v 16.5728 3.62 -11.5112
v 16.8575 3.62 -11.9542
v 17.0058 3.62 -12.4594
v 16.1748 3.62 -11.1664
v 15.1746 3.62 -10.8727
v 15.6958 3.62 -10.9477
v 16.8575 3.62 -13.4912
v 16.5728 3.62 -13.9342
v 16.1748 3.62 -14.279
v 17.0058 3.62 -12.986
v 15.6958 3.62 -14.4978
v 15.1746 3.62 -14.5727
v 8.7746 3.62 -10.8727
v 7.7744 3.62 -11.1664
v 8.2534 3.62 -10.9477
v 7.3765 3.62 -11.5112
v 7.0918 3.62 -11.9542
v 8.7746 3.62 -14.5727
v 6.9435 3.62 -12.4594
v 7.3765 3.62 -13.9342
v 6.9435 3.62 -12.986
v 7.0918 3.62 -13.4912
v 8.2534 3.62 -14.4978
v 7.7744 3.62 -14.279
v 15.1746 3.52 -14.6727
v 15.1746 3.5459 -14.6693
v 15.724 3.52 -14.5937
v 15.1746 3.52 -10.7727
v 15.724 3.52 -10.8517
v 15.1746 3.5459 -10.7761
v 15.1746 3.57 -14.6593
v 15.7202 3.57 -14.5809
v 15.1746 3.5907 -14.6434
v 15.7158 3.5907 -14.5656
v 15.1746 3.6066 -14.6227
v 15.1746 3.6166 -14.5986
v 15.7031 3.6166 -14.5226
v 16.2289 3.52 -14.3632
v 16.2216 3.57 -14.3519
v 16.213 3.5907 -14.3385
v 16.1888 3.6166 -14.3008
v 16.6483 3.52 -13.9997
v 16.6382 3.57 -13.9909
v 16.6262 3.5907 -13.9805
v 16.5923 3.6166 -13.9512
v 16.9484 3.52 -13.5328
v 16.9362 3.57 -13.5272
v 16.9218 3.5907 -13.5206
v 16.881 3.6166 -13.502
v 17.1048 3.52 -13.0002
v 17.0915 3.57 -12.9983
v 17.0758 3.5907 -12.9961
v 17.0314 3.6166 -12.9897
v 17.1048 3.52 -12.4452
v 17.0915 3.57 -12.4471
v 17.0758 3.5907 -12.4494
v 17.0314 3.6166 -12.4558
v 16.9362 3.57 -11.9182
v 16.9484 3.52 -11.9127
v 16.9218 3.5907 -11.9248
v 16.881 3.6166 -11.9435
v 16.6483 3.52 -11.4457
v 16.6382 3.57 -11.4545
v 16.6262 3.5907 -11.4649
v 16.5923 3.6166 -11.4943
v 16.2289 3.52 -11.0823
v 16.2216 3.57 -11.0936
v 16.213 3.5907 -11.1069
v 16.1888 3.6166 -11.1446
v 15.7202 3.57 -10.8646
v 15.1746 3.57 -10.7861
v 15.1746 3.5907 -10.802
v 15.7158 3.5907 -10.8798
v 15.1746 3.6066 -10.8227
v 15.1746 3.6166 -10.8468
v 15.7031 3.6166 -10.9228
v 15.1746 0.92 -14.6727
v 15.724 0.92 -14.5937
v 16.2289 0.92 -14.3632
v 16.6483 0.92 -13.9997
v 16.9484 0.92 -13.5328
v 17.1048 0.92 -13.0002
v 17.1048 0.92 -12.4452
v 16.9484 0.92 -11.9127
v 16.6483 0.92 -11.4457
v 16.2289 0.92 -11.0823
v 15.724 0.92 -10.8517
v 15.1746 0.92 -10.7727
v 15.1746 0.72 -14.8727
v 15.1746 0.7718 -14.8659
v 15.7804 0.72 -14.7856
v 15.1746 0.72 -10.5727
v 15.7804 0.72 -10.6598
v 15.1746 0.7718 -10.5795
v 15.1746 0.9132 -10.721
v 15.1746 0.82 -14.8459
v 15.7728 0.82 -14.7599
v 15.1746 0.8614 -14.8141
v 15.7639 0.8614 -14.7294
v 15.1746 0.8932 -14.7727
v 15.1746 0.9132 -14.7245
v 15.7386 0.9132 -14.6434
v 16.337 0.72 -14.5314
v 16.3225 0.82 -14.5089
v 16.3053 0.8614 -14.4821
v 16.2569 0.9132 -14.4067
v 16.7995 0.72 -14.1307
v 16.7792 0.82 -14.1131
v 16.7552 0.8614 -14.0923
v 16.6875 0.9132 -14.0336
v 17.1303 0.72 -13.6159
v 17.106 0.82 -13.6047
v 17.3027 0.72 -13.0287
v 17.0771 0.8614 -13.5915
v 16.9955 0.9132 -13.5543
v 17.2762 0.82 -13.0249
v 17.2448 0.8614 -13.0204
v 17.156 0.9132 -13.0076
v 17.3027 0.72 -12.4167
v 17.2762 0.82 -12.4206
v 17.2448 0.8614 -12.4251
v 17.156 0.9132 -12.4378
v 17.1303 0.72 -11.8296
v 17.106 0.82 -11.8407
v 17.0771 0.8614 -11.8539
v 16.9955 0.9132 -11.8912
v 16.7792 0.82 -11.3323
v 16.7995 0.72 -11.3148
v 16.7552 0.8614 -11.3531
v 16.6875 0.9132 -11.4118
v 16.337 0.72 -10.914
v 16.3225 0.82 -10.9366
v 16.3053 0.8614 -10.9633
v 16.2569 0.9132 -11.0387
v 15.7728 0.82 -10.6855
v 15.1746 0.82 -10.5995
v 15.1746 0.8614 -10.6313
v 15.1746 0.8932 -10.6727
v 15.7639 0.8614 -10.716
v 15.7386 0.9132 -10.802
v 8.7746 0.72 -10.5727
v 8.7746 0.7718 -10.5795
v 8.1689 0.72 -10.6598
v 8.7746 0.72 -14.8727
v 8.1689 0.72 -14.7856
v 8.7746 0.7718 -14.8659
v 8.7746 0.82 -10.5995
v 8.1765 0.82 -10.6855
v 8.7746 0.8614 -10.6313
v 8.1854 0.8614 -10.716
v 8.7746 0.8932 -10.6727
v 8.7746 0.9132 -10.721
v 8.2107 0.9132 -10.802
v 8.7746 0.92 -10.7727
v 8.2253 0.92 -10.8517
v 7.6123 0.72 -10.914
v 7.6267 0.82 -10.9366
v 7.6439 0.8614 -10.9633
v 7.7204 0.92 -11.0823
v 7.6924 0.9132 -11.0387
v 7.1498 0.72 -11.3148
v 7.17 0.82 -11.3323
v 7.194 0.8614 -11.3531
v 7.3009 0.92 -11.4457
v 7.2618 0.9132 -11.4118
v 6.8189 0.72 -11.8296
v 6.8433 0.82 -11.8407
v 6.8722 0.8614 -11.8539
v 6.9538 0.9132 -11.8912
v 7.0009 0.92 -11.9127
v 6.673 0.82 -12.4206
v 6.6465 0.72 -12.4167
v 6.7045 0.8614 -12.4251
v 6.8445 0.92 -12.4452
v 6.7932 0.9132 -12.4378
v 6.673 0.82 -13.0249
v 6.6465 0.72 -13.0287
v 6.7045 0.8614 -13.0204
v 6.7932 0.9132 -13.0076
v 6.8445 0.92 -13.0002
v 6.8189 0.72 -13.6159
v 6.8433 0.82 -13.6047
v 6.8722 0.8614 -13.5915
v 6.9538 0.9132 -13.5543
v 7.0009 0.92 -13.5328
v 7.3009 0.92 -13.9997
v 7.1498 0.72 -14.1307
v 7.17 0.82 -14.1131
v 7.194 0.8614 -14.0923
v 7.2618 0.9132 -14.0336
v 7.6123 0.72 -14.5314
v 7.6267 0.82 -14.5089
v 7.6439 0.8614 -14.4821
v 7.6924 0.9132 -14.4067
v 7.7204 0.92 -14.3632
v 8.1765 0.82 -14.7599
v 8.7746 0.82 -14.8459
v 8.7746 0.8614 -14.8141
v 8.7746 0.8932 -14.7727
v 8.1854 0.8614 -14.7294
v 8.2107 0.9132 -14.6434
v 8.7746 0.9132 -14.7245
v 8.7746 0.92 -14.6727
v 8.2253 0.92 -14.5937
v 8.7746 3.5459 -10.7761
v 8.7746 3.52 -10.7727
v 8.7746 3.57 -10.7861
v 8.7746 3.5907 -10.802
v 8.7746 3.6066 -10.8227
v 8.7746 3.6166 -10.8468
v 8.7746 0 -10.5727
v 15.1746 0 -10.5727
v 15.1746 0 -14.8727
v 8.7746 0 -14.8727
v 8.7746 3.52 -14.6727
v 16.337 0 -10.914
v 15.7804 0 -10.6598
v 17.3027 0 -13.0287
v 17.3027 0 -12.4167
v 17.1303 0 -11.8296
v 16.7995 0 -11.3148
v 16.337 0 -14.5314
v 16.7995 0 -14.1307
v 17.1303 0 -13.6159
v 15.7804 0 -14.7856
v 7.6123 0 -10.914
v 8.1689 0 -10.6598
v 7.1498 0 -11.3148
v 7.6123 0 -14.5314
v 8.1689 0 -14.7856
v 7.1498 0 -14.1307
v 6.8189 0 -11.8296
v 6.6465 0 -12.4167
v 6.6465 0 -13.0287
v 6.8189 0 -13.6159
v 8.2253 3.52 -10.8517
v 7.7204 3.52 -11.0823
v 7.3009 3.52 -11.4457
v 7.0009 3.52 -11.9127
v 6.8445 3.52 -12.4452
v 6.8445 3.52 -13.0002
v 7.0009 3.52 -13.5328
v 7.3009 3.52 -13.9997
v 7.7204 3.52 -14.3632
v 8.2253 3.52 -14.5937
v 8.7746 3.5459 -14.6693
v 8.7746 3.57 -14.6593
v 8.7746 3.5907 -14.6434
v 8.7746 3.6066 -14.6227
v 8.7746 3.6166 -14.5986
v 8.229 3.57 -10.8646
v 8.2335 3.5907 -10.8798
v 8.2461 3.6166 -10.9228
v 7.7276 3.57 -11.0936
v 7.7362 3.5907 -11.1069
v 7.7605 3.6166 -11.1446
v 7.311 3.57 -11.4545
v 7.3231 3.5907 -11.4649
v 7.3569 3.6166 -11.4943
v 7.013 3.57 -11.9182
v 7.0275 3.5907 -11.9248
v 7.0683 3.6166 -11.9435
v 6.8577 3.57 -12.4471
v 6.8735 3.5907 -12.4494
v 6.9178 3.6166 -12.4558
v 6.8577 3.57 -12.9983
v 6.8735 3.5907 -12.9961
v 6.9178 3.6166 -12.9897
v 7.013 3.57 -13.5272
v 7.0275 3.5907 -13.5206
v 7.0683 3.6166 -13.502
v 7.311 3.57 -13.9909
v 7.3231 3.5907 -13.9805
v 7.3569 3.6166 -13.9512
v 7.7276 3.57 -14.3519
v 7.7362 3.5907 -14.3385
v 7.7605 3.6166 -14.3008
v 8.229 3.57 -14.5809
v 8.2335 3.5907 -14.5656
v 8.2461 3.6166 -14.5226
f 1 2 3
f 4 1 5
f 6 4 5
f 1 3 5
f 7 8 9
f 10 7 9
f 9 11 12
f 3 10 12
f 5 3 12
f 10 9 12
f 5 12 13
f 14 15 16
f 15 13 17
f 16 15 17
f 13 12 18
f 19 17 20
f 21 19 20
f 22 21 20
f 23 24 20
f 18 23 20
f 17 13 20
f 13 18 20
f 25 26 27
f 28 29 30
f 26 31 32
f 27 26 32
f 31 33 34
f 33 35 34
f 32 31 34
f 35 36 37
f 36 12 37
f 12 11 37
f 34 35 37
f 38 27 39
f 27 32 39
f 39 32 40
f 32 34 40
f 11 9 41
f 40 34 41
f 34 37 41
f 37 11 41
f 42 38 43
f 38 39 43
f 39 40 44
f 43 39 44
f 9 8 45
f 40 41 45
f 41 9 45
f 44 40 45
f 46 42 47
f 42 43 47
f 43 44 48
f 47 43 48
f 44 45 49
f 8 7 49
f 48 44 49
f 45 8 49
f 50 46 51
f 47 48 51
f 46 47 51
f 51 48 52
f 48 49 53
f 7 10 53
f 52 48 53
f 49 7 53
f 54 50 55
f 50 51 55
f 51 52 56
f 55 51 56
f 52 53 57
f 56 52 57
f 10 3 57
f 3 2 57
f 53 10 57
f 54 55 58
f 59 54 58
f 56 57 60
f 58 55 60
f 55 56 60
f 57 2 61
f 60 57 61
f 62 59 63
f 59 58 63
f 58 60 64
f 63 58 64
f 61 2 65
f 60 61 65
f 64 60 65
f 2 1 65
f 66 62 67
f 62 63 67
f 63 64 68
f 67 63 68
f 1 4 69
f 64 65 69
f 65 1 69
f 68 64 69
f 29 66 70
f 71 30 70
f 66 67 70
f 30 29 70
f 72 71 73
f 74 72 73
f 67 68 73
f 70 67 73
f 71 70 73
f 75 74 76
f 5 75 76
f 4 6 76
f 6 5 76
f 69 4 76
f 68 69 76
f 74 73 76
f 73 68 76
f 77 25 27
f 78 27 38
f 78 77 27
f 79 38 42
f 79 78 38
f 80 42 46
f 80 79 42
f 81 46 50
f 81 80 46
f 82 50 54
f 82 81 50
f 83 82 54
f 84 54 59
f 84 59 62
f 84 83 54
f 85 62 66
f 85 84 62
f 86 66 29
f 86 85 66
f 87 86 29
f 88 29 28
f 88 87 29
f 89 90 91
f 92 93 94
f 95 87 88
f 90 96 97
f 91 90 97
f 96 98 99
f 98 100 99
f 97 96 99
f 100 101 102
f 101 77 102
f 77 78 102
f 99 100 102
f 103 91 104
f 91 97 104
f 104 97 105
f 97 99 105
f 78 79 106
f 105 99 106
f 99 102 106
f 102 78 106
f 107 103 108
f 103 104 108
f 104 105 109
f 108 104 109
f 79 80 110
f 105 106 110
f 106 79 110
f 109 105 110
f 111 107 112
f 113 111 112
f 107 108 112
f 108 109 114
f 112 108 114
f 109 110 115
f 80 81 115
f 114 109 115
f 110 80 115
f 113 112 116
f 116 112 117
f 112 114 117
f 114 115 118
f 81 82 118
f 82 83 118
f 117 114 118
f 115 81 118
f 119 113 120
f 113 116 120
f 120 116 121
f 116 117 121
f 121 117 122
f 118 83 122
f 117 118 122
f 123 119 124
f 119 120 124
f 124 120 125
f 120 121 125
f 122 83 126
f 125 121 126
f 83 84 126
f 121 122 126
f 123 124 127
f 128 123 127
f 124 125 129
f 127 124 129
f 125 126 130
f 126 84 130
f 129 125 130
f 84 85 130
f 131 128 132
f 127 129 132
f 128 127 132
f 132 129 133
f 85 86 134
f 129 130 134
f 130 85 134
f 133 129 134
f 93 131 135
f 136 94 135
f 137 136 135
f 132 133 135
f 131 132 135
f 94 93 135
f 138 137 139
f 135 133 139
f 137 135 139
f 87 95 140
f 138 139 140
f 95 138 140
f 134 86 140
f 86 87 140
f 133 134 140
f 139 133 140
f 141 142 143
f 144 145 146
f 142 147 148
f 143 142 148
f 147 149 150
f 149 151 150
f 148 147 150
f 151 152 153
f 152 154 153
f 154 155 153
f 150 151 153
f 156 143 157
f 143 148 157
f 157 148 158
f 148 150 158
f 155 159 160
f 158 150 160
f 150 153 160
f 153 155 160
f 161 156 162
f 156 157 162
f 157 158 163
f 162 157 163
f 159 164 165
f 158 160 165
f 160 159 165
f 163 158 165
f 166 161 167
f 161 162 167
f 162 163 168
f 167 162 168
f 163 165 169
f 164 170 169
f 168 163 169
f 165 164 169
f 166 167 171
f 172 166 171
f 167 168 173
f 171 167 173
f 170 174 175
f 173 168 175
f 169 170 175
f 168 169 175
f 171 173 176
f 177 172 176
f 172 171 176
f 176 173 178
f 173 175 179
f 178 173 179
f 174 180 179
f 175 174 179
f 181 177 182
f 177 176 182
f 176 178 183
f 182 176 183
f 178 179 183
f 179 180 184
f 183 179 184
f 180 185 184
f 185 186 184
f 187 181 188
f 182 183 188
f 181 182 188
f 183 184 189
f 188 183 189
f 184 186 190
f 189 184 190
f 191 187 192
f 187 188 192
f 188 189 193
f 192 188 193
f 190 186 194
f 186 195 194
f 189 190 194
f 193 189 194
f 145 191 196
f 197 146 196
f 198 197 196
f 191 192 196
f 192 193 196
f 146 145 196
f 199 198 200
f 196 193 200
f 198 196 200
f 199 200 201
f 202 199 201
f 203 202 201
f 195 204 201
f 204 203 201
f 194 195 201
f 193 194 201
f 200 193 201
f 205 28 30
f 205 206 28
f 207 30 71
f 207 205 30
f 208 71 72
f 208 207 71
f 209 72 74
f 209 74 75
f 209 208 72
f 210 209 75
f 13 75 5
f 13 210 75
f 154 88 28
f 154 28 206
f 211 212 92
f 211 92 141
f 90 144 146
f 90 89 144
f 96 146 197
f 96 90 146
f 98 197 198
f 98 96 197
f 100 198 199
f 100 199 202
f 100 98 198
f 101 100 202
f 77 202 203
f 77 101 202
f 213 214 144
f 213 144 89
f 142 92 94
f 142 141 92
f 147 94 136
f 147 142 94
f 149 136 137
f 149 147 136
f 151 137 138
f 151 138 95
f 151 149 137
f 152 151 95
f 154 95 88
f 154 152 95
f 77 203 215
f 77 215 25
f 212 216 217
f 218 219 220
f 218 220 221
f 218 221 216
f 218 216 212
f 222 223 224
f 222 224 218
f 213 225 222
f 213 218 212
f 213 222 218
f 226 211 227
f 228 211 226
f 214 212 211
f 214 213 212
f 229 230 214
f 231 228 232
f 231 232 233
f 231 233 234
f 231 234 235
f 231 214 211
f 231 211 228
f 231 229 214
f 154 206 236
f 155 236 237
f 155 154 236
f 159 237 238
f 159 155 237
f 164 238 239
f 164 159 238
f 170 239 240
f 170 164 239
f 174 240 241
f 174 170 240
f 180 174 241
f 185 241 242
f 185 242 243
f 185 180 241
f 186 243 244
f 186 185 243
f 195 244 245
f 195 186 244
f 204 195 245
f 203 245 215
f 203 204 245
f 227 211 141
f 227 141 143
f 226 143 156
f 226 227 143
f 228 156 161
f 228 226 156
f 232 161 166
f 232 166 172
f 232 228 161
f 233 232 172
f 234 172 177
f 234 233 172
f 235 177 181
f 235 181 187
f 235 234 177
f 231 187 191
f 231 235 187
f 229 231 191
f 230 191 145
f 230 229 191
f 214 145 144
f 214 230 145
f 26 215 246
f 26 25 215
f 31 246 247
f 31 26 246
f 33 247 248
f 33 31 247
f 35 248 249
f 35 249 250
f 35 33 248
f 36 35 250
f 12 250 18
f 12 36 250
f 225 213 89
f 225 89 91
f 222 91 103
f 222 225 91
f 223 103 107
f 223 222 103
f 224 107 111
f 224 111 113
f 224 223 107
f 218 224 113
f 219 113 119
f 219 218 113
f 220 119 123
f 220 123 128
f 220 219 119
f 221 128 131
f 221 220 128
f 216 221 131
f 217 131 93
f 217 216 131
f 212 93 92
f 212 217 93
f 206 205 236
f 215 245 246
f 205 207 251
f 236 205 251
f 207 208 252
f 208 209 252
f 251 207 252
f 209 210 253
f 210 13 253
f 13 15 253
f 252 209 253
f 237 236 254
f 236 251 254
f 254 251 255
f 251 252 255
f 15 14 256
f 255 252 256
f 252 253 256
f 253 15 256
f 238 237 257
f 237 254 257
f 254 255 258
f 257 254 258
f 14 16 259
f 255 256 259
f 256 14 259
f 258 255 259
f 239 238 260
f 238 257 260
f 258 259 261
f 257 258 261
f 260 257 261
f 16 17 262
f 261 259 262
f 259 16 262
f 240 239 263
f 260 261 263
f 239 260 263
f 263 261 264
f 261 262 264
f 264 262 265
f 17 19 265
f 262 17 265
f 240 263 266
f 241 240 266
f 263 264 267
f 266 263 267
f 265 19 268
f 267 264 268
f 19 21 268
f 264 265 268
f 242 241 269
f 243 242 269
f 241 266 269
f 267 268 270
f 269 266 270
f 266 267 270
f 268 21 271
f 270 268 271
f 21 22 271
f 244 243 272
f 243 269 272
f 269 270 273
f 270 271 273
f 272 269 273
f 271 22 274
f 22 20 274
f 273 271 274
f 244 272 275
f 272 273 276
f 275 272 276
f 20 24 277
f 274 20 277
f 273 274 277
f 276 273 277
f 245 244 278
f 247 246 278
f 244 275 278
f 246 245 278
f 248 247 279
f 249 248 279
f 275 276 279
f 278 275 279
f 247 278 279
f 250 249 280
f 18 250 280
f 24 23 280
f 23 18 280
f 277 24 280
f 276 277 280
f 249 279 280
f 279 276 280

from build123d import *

# Parameters (mm, degrees)
BOSS_EXTRUDE1_DEPTH = 0.92
FILLET3_R           = 0.2
BOSS_EXTRUDE2_DEPTH = 2.7
FILLET4_R           = 0.1


with BuildPart() as part:
    # Sketch2 → Boss-Extrude1 (new body)
    with BuildSketch(Plane(origin=(0, 0, 0), x_dir=(1, 0, 0), z_dir=(0, 1, 0))):
        with BuildLine():
            Line((8.774632583, 14.872725815), (15.174632583, 14.872725815))
            ThreePointArc((15.174632583, 14.872725815), (17.324632583, 12.722725815), (15.174632583, 10.572725815))
            Line((15.174632583, 10.572725815), (8.774632583, 10.572725815))
            ThreePointArc((8.774632583, 10.572725815), (6.624632583, 12.722725815), (8.774632583, 14.872725815))
        make_face()
    extrude(amount=BOSS_EXTRUDE1_DEPTH)

    # Fillet3
    fillet3_edges = [part.edges().sort_by_distance(p)[0] for p in [
        (17.324632583, 0.92, -12.722725815),
        (11.974632583, 0.92, -14.872725815),
        (6.624632583, 0.92, -12.722725815),
        (11.974632583, 0.92, -10.572725815),
    ]]
    fillet(fillet3_edges, radius=FILLET3_R)

    # Sketch5 → Boss-Extrude2 (add)
    with BuildSketch(Plane(origin=(0, 0.92, 0), x_dir=(1, 0, 0), z_dir=(0, 1, 0))):
        with BuildLine():
            Line((8.774632583, 14.672725815), (15.174632583, 14.672725815))
            ThreePointArc((15.174632583, 14.672725815), (17.124632583, 12.722725815), (15.174632583, 10.772725815))
            Line((15.174632583, 10.772725815), (8.774632583, 10.772725815))
            ThreePointArc((8.774632583, 10.772725815), (6.824632583, 12.722725815), (8.774632583, 14.672725815))
        make_face()
    extrude(amount=BOSS_EXTRUDE2_DEPTH)

    # Fillet4
    fillet4_edges = [part.edges().sort_by_distance(p)[0] for p in [
        (6.824632583, 3.62, -12.722725815),
        (11.974632583, 3.62, -10.772725815),
        (17.124632583, 3.62, -12.722725815),
        (11.974632583, 3.62, -14.672725815),
    ]]
    fillet(fillet4_edges, radius=FILLET4_R)


solid = part.part
